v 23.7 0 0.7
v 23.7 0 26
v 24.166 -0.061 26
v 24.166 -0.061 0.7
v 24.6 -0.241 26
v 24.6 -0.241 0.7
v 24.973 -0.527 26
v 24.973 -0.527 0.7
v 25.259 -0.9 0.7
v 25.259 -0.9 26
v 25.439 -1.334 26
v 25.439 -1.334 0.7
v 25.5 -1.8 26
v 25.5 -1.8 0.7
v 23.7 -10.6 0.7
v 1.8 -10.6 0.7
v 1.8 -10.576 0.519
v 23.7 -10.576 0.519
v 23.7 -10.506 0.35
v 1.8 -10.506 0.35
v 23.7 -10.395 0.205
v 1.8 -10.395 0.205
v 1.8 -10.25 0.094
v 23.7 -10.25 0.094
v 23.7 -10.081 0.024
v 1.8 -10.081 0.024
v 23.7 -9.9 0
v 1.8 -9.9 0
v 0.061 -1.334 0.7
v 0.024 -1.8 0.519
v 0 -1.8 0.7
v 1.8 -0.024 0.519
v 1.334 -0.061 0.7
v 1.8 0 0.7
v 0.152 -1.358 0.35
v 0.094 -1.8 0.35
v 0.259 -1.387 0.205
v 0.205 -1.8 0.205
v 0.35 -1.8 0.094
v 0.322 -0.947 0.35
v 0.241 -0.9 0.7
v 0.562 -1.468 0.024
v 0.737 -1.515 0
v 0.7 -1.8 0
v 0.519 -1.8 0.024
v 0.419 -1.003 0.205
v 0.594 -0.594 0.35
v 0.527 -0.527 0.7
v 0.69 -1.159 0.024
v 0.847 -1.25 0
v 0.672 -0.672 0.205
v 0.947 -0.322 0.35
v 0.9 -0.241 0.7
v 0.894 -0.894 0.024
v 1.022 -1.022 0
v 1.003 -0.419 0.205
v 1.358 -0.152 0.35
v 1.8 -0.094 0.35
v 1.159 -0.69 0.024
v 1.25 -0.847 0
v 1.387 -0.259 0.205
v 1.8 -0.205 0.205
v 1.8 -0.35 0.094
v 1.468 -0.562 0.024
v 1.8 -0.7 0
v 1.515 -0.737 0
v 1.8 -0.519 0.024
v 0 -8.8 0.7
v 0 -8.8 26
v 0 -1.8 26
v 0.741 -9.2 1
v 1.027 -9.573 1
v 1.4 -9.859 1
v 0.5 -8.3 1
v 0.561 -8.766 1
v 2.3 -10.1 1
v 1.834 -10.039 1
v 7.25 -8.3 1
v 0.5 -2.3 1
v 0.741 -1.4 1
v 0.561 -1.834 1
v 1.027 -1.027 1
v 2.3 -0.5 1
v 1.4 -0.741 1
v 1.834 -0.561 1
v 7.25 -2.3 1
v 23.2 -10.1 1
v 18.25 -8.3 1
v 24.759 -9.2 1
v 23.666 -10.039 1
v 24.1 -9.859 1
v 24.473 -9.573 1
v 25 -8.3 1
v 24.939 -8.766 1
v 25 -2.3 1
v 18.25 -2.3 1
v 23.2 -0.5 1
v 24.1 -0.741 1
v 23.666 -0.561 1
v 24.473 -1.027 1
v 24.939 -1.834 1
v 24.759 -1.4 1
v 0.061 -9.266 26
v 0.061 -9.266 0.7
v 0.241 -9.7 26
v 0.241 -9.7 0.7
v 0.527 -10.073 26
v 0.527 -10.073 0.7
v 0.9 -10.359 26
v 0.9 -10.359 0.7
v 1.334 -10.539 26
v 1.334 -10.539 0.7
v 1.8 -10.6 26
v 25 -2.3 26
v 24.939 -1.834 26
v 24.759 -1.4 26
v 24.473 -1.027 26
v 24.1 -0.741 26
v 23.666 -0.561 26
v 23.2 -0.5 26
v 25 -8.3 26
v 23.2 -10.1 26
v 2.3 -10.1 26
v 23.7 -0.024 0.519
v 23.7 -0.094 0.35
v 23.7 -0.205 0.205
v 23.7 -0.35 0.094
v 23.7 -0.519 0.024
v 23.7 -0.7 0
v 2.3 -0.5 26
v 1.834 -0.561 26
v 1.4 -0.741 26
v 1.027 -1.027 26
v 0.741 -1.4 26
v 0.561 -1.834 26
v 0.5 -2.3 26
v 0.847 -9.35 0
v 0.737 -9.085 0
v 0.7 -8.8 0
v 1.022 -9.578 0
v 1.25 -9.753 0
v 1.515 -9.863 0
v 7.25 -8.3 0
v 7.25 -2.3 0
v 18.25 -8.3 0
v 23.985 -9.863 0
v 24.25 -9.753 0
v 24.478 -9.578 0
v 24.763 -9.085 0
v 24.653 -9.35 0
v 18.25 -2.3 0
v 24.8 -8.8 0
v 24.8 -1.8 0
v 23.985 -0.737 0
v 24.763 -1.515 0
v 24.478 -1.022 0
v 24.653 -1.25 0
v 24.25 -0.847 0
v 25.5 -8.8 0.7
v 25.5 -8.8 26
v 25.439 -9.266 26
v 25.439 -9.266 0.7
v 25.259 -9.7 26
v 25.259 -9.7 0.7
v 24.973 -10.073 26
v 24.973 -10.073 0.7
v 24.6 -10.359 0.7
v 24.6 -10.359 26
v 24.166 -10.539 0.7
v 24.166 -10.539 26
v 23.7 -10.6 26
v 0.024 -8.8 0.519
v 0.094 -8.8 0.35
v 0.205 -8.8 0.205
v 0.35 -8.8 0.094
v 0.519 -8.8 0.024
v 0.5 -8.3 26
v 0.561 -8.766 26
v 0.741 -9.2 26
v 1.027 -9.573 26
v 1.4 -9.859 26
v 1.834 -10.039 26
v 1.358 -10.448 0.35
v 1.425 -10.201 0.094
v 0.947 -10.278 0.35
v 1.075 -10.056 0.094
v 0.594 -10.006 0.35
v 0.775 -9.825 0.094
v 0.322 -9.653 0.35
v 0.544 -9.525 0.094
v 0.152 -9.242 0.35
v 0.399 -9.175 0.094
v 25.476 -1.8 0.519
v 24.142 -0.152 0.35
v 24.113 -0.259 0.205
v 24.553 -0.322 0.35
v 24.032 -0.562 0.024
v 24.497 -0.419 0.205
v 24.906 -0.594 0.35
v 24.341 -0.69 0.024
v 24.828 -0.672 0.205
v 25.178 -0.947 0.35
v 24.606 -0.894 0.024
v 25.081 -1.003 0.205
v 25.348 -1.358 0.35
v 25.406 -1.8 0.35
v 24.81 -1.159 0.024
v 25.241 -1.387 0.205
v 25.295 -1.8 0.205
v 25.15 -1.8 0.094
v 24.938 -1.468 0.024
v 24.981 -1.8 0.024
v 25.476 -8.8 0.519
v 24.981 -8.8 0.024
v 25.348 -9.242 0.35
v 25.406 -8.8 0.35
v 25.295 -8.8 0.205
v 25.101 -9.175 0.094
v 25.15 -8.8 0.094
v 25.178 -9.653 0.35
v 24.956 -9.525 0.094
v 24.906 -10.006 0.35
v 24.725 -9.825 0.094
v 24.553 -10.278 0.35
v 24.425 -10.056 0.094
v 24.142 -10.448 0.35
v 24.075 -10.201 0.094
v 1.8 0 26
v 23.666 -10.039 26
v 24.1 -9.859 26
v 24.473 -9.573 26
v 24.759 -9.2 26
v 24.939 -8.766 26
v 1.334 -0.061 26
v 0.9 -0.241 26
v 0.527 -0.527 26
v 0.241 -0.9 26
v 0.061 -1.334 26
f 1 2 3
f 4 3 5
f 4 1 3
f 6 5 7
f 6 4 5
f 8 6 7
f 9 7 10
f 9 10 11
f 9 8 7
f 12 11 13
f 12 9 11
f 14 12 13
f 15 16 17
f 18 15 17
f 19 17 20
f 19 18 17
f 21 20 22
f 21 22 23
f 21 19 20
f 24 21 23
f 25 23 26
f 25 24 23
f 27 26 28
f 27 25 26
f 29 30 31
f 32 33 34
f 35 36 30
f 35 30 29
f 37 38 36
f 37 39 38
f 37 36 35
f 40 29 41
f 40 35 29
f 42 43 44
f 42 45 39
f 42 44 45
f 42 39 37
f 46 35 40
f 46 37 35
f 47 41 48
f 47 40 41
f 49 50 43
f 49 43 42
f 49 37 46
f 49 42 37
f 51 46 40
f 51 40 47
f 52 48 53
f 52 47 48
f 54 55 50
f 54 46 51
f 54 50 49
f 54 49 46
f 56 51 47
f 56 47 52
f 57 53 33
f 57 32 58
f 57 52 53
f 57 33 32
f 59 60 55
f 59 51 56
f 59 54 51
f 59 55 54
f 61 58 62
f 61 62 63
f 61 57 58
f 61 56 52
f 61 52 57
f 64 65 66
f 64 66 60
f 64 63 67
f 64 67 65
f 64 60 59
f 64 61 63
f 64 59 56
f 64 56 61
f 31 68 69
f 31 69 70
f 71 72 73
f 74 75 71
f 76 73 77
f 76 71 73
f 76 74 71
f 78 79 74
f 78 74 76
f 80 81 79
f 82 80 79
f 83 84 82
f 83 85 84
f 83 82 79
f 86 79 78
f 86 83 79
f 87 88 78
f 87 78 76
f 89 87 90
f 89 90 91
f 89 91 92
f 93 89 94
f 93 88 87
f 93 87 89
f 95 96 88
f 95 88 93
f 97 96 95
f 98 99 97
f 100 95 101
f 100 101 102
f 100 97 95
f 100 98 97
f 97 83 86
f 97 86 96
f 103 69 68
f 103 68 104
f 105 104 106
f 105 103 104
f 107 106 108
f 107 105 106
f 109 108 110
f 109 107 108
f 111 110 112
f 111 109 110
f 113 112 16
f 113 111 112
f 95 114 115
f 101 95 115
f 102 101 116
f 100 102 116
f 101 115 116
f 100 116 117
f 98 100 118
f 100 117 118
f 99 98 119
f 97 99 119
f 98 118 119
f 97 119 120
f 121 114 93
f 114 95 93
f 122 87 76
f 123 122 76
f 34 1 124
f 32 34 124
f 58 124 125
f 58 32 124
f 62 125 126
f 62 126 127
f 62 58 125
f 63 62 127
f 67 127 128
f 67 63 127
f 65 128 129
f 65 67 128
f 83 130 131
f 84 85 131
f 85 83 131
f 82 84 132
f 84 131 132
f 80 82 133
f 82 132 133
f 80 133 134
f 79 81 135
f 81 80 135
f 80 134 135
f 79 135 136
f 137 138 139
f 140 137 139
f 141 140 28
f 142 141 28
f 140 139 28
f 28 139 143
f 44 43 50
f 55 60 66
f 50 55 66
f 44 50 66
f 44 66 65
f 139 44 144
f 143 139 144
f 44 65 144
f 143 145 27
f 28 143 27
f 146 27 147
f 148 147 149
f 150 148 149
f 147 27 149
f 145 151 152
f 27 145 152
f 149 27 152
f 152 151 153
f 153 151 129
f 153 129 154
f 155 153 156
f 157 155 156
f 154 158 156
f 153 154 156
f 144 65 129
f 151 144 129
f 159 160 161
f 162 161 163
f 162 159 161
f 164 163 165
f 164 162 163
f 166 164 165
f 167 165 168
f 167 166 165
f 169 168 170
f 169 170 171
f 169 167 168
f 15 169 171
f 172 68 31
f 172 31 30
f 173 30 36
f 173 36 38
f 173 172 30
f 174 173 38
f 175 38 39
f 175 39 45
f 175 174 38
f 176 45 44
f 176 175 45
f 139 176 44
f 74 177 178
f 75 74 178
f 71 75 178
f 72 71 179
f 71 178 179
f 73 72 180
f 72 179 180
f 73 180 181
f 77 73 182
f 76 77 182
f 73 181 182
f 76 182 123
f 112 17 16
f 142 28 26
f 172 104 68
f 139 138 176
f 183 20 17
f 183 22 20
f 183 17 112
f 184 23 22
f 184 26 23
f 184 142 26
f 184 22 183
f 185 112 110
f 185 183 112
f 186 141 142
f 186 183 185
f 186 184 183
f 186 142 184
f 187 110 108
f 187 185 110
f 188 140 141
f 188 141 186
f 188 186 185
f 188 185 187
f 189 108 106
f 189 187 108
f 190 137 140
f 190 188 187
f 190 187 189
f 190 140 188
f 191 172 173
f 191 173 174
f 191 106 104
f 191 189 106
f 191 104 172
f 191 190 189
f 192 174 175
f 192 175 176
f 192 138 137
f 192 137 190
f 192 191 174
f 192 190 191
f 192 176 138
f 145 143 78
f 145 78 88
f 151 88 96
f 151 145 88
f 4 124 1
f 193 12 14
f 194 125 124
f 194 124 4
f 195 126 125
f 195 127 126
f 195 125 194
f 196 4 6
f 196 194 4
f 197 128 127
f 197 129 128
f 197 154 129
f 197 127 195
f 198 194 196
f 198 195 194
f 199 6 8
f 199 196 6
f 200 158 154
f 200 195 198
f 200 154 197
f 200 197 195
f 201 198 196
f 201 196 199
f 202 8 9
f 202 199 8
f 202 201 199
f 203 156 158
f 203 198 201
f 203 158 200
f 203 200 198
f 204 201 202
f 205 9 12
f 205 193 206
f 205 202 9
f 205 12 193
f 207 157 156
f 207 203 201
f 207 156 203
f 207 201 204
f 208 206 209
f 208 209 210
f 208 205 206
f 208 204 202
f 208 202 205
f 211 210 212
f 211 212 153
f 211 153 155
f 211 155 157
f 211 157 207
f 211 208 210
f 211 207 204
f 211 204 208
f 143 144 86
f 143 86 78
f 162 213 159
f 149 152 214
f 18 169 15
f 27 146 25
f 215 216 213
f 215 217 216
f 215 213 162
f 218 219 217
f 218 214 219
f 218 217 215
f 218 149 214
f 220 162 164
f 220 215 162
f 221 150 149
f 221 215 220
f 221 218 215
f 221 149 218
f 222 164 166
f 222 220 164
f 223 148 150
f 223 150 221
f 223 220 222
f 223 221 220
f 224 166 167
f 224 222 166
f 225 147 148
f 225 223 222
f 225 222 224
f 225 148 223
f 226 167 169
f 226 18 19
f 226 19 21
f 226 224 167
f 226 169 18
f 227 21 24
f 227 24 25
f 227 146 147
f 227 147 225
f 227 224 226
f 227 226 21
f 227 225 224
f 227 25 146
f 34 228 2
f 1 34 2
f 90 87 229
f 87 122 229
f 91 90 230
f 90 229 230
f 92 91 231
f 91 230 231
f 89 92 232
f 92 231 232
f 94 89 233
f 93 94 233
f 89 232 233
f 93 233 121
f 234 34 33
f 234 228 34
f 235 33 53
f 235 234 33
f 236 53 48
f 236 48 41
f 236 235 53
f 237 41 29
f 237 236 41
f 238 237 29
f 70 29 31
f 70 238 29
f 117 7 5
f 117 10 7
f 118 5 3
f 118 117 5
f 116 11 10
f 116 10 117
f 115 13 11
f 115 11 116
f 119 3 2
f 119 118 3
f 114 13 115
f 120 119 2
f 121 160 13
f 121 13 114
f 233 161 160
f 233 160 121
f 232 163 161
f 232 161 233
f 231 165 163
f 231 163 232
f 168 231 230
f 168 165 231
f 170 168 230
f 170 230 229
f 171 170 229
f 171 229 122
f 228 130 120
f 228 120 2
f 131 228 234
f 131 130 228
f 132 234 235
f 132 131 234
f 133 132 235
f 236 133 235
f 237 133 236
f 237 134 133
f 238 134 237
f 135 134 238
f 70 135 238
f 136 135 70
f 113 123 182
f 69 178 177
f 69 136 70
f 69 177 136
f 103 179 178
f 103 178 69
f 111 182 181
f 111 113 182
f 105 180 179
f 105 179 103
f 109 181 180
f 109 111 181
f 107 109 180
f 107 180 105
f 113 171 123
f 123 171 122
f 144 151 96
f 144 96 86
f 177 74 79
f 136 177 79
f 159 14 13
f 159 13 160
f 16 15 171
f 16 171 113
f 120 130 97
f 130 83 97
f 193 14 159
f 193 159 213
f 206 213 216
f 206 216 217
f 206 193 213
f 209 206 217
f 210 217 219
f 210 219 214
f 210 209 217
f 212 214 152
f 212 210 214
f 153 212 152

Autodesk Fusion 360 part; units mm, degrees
sketch "Sketch1" plane through (0, 0, 0) normal (0, 0, 1) x (1, 0, 0)
  line L0 (0, 0) -> (25.5, 0)
  line L1 (25.5, 0) -> (25.5, -10.6)
  line L2 (25.5, -10.6) -> (0, -10.6)
  line L3 (0, -10.6) -> (0, 0)
  dimension "d1" = 10.6
  dimension "d2" = 25.5
extrude "Extrude1" add sketch "Sketch1" along normal blind 1
sketch "Sketch2" plane through (0, 0, 1) normal (0, 0, 1) x (-1, 0, 0)
  line L0 (0, 10.6) -> (-25.5, 10.6)
  line L1 (-25.5, 10.6) -> (-25.5, 0)
  line L2 (-25.5, 0) -> (0, 0)
  line L3 (0, 0) -> (0, 10.6)
  line L4 (-0.5, 0.5) -> (-25, 0.5)
  line L5 (-25, 0.5) -> (-25, 10.1)
  line L6 (-25, 10.1) -> (-0.5, 10.1)
  line L7 (-0.5, 10.1) -> (-0.5, 0.5)
  line L8 (-25.5, 10.6) -> (0, 10.6)
  dimension "d5" = 0.5
  dimension "d6" = 0.5
  dimension "d26" = 0.5
  dimension "d27" = 0.5
extrude "Extrude2" add sketch "Sketch2" along normal blind 25
sketch "Sketch3" plane through (0, 0, 0) normal (0, 0, -1) x (1, 0, 0)
  line L0 (25.5, 10.6) -> (0, 10.6)
  line L1 (0, 10.6) -> (0, 0)
  line L2 (0, 0) -> (25.5, 0)
  line L3 (25.5, 0) -> (25.5, 10.6)
  line L4 (7.25, 8.3) -> (18.25, 8.3)
  line L5 (18.25, 8.3) -> (18.25, 2.3)
  line L6 (18.25, 2.3) -> (7.25, 2.3)
  line L7 (7.25, 2.3) -> (7.25, 8.3)
  dimension "d12" = 11
  dimension "d13" = 6
  dimension "d14" = 2.3
  dimension "d15" = 7.25
  dimension "d28" = 25.5
  dimension "d29" = 10.6
extrude "Extrude3" cut sketch "Sketch3" against normal blind 11 contours L4 L5 L6 L7
fillet "Fillet1" radius 1.8 4 edges at (25, -10.1, 13.5) (0.5, -0.5, 13.5) (0.5, -10.1, 13.5) (25, -0.5, 13.5)
fillet "Fillet2" radius 1.8 4 edges at (0, -10.6, 13) (25.5, -10.6, 13) (25.5, 0, 13) (0, 0, 13)
fillet "Fillet3" radius 0.7 8 edges at (0.5272, -10.0728, 0) (0, -5.3, 0) (0.5272, -0.5272, 0) (12.75, 0, 0) (24.9728, -0.5272, 0) (25.5, -5.3, 0) (24.9728, -10.0728, 0) (12.75, -10.6, 0)
equation "d14 = ( d29 - d13 ) / 2"
equation "d15 = ( d28 - d12 ) / 2"
